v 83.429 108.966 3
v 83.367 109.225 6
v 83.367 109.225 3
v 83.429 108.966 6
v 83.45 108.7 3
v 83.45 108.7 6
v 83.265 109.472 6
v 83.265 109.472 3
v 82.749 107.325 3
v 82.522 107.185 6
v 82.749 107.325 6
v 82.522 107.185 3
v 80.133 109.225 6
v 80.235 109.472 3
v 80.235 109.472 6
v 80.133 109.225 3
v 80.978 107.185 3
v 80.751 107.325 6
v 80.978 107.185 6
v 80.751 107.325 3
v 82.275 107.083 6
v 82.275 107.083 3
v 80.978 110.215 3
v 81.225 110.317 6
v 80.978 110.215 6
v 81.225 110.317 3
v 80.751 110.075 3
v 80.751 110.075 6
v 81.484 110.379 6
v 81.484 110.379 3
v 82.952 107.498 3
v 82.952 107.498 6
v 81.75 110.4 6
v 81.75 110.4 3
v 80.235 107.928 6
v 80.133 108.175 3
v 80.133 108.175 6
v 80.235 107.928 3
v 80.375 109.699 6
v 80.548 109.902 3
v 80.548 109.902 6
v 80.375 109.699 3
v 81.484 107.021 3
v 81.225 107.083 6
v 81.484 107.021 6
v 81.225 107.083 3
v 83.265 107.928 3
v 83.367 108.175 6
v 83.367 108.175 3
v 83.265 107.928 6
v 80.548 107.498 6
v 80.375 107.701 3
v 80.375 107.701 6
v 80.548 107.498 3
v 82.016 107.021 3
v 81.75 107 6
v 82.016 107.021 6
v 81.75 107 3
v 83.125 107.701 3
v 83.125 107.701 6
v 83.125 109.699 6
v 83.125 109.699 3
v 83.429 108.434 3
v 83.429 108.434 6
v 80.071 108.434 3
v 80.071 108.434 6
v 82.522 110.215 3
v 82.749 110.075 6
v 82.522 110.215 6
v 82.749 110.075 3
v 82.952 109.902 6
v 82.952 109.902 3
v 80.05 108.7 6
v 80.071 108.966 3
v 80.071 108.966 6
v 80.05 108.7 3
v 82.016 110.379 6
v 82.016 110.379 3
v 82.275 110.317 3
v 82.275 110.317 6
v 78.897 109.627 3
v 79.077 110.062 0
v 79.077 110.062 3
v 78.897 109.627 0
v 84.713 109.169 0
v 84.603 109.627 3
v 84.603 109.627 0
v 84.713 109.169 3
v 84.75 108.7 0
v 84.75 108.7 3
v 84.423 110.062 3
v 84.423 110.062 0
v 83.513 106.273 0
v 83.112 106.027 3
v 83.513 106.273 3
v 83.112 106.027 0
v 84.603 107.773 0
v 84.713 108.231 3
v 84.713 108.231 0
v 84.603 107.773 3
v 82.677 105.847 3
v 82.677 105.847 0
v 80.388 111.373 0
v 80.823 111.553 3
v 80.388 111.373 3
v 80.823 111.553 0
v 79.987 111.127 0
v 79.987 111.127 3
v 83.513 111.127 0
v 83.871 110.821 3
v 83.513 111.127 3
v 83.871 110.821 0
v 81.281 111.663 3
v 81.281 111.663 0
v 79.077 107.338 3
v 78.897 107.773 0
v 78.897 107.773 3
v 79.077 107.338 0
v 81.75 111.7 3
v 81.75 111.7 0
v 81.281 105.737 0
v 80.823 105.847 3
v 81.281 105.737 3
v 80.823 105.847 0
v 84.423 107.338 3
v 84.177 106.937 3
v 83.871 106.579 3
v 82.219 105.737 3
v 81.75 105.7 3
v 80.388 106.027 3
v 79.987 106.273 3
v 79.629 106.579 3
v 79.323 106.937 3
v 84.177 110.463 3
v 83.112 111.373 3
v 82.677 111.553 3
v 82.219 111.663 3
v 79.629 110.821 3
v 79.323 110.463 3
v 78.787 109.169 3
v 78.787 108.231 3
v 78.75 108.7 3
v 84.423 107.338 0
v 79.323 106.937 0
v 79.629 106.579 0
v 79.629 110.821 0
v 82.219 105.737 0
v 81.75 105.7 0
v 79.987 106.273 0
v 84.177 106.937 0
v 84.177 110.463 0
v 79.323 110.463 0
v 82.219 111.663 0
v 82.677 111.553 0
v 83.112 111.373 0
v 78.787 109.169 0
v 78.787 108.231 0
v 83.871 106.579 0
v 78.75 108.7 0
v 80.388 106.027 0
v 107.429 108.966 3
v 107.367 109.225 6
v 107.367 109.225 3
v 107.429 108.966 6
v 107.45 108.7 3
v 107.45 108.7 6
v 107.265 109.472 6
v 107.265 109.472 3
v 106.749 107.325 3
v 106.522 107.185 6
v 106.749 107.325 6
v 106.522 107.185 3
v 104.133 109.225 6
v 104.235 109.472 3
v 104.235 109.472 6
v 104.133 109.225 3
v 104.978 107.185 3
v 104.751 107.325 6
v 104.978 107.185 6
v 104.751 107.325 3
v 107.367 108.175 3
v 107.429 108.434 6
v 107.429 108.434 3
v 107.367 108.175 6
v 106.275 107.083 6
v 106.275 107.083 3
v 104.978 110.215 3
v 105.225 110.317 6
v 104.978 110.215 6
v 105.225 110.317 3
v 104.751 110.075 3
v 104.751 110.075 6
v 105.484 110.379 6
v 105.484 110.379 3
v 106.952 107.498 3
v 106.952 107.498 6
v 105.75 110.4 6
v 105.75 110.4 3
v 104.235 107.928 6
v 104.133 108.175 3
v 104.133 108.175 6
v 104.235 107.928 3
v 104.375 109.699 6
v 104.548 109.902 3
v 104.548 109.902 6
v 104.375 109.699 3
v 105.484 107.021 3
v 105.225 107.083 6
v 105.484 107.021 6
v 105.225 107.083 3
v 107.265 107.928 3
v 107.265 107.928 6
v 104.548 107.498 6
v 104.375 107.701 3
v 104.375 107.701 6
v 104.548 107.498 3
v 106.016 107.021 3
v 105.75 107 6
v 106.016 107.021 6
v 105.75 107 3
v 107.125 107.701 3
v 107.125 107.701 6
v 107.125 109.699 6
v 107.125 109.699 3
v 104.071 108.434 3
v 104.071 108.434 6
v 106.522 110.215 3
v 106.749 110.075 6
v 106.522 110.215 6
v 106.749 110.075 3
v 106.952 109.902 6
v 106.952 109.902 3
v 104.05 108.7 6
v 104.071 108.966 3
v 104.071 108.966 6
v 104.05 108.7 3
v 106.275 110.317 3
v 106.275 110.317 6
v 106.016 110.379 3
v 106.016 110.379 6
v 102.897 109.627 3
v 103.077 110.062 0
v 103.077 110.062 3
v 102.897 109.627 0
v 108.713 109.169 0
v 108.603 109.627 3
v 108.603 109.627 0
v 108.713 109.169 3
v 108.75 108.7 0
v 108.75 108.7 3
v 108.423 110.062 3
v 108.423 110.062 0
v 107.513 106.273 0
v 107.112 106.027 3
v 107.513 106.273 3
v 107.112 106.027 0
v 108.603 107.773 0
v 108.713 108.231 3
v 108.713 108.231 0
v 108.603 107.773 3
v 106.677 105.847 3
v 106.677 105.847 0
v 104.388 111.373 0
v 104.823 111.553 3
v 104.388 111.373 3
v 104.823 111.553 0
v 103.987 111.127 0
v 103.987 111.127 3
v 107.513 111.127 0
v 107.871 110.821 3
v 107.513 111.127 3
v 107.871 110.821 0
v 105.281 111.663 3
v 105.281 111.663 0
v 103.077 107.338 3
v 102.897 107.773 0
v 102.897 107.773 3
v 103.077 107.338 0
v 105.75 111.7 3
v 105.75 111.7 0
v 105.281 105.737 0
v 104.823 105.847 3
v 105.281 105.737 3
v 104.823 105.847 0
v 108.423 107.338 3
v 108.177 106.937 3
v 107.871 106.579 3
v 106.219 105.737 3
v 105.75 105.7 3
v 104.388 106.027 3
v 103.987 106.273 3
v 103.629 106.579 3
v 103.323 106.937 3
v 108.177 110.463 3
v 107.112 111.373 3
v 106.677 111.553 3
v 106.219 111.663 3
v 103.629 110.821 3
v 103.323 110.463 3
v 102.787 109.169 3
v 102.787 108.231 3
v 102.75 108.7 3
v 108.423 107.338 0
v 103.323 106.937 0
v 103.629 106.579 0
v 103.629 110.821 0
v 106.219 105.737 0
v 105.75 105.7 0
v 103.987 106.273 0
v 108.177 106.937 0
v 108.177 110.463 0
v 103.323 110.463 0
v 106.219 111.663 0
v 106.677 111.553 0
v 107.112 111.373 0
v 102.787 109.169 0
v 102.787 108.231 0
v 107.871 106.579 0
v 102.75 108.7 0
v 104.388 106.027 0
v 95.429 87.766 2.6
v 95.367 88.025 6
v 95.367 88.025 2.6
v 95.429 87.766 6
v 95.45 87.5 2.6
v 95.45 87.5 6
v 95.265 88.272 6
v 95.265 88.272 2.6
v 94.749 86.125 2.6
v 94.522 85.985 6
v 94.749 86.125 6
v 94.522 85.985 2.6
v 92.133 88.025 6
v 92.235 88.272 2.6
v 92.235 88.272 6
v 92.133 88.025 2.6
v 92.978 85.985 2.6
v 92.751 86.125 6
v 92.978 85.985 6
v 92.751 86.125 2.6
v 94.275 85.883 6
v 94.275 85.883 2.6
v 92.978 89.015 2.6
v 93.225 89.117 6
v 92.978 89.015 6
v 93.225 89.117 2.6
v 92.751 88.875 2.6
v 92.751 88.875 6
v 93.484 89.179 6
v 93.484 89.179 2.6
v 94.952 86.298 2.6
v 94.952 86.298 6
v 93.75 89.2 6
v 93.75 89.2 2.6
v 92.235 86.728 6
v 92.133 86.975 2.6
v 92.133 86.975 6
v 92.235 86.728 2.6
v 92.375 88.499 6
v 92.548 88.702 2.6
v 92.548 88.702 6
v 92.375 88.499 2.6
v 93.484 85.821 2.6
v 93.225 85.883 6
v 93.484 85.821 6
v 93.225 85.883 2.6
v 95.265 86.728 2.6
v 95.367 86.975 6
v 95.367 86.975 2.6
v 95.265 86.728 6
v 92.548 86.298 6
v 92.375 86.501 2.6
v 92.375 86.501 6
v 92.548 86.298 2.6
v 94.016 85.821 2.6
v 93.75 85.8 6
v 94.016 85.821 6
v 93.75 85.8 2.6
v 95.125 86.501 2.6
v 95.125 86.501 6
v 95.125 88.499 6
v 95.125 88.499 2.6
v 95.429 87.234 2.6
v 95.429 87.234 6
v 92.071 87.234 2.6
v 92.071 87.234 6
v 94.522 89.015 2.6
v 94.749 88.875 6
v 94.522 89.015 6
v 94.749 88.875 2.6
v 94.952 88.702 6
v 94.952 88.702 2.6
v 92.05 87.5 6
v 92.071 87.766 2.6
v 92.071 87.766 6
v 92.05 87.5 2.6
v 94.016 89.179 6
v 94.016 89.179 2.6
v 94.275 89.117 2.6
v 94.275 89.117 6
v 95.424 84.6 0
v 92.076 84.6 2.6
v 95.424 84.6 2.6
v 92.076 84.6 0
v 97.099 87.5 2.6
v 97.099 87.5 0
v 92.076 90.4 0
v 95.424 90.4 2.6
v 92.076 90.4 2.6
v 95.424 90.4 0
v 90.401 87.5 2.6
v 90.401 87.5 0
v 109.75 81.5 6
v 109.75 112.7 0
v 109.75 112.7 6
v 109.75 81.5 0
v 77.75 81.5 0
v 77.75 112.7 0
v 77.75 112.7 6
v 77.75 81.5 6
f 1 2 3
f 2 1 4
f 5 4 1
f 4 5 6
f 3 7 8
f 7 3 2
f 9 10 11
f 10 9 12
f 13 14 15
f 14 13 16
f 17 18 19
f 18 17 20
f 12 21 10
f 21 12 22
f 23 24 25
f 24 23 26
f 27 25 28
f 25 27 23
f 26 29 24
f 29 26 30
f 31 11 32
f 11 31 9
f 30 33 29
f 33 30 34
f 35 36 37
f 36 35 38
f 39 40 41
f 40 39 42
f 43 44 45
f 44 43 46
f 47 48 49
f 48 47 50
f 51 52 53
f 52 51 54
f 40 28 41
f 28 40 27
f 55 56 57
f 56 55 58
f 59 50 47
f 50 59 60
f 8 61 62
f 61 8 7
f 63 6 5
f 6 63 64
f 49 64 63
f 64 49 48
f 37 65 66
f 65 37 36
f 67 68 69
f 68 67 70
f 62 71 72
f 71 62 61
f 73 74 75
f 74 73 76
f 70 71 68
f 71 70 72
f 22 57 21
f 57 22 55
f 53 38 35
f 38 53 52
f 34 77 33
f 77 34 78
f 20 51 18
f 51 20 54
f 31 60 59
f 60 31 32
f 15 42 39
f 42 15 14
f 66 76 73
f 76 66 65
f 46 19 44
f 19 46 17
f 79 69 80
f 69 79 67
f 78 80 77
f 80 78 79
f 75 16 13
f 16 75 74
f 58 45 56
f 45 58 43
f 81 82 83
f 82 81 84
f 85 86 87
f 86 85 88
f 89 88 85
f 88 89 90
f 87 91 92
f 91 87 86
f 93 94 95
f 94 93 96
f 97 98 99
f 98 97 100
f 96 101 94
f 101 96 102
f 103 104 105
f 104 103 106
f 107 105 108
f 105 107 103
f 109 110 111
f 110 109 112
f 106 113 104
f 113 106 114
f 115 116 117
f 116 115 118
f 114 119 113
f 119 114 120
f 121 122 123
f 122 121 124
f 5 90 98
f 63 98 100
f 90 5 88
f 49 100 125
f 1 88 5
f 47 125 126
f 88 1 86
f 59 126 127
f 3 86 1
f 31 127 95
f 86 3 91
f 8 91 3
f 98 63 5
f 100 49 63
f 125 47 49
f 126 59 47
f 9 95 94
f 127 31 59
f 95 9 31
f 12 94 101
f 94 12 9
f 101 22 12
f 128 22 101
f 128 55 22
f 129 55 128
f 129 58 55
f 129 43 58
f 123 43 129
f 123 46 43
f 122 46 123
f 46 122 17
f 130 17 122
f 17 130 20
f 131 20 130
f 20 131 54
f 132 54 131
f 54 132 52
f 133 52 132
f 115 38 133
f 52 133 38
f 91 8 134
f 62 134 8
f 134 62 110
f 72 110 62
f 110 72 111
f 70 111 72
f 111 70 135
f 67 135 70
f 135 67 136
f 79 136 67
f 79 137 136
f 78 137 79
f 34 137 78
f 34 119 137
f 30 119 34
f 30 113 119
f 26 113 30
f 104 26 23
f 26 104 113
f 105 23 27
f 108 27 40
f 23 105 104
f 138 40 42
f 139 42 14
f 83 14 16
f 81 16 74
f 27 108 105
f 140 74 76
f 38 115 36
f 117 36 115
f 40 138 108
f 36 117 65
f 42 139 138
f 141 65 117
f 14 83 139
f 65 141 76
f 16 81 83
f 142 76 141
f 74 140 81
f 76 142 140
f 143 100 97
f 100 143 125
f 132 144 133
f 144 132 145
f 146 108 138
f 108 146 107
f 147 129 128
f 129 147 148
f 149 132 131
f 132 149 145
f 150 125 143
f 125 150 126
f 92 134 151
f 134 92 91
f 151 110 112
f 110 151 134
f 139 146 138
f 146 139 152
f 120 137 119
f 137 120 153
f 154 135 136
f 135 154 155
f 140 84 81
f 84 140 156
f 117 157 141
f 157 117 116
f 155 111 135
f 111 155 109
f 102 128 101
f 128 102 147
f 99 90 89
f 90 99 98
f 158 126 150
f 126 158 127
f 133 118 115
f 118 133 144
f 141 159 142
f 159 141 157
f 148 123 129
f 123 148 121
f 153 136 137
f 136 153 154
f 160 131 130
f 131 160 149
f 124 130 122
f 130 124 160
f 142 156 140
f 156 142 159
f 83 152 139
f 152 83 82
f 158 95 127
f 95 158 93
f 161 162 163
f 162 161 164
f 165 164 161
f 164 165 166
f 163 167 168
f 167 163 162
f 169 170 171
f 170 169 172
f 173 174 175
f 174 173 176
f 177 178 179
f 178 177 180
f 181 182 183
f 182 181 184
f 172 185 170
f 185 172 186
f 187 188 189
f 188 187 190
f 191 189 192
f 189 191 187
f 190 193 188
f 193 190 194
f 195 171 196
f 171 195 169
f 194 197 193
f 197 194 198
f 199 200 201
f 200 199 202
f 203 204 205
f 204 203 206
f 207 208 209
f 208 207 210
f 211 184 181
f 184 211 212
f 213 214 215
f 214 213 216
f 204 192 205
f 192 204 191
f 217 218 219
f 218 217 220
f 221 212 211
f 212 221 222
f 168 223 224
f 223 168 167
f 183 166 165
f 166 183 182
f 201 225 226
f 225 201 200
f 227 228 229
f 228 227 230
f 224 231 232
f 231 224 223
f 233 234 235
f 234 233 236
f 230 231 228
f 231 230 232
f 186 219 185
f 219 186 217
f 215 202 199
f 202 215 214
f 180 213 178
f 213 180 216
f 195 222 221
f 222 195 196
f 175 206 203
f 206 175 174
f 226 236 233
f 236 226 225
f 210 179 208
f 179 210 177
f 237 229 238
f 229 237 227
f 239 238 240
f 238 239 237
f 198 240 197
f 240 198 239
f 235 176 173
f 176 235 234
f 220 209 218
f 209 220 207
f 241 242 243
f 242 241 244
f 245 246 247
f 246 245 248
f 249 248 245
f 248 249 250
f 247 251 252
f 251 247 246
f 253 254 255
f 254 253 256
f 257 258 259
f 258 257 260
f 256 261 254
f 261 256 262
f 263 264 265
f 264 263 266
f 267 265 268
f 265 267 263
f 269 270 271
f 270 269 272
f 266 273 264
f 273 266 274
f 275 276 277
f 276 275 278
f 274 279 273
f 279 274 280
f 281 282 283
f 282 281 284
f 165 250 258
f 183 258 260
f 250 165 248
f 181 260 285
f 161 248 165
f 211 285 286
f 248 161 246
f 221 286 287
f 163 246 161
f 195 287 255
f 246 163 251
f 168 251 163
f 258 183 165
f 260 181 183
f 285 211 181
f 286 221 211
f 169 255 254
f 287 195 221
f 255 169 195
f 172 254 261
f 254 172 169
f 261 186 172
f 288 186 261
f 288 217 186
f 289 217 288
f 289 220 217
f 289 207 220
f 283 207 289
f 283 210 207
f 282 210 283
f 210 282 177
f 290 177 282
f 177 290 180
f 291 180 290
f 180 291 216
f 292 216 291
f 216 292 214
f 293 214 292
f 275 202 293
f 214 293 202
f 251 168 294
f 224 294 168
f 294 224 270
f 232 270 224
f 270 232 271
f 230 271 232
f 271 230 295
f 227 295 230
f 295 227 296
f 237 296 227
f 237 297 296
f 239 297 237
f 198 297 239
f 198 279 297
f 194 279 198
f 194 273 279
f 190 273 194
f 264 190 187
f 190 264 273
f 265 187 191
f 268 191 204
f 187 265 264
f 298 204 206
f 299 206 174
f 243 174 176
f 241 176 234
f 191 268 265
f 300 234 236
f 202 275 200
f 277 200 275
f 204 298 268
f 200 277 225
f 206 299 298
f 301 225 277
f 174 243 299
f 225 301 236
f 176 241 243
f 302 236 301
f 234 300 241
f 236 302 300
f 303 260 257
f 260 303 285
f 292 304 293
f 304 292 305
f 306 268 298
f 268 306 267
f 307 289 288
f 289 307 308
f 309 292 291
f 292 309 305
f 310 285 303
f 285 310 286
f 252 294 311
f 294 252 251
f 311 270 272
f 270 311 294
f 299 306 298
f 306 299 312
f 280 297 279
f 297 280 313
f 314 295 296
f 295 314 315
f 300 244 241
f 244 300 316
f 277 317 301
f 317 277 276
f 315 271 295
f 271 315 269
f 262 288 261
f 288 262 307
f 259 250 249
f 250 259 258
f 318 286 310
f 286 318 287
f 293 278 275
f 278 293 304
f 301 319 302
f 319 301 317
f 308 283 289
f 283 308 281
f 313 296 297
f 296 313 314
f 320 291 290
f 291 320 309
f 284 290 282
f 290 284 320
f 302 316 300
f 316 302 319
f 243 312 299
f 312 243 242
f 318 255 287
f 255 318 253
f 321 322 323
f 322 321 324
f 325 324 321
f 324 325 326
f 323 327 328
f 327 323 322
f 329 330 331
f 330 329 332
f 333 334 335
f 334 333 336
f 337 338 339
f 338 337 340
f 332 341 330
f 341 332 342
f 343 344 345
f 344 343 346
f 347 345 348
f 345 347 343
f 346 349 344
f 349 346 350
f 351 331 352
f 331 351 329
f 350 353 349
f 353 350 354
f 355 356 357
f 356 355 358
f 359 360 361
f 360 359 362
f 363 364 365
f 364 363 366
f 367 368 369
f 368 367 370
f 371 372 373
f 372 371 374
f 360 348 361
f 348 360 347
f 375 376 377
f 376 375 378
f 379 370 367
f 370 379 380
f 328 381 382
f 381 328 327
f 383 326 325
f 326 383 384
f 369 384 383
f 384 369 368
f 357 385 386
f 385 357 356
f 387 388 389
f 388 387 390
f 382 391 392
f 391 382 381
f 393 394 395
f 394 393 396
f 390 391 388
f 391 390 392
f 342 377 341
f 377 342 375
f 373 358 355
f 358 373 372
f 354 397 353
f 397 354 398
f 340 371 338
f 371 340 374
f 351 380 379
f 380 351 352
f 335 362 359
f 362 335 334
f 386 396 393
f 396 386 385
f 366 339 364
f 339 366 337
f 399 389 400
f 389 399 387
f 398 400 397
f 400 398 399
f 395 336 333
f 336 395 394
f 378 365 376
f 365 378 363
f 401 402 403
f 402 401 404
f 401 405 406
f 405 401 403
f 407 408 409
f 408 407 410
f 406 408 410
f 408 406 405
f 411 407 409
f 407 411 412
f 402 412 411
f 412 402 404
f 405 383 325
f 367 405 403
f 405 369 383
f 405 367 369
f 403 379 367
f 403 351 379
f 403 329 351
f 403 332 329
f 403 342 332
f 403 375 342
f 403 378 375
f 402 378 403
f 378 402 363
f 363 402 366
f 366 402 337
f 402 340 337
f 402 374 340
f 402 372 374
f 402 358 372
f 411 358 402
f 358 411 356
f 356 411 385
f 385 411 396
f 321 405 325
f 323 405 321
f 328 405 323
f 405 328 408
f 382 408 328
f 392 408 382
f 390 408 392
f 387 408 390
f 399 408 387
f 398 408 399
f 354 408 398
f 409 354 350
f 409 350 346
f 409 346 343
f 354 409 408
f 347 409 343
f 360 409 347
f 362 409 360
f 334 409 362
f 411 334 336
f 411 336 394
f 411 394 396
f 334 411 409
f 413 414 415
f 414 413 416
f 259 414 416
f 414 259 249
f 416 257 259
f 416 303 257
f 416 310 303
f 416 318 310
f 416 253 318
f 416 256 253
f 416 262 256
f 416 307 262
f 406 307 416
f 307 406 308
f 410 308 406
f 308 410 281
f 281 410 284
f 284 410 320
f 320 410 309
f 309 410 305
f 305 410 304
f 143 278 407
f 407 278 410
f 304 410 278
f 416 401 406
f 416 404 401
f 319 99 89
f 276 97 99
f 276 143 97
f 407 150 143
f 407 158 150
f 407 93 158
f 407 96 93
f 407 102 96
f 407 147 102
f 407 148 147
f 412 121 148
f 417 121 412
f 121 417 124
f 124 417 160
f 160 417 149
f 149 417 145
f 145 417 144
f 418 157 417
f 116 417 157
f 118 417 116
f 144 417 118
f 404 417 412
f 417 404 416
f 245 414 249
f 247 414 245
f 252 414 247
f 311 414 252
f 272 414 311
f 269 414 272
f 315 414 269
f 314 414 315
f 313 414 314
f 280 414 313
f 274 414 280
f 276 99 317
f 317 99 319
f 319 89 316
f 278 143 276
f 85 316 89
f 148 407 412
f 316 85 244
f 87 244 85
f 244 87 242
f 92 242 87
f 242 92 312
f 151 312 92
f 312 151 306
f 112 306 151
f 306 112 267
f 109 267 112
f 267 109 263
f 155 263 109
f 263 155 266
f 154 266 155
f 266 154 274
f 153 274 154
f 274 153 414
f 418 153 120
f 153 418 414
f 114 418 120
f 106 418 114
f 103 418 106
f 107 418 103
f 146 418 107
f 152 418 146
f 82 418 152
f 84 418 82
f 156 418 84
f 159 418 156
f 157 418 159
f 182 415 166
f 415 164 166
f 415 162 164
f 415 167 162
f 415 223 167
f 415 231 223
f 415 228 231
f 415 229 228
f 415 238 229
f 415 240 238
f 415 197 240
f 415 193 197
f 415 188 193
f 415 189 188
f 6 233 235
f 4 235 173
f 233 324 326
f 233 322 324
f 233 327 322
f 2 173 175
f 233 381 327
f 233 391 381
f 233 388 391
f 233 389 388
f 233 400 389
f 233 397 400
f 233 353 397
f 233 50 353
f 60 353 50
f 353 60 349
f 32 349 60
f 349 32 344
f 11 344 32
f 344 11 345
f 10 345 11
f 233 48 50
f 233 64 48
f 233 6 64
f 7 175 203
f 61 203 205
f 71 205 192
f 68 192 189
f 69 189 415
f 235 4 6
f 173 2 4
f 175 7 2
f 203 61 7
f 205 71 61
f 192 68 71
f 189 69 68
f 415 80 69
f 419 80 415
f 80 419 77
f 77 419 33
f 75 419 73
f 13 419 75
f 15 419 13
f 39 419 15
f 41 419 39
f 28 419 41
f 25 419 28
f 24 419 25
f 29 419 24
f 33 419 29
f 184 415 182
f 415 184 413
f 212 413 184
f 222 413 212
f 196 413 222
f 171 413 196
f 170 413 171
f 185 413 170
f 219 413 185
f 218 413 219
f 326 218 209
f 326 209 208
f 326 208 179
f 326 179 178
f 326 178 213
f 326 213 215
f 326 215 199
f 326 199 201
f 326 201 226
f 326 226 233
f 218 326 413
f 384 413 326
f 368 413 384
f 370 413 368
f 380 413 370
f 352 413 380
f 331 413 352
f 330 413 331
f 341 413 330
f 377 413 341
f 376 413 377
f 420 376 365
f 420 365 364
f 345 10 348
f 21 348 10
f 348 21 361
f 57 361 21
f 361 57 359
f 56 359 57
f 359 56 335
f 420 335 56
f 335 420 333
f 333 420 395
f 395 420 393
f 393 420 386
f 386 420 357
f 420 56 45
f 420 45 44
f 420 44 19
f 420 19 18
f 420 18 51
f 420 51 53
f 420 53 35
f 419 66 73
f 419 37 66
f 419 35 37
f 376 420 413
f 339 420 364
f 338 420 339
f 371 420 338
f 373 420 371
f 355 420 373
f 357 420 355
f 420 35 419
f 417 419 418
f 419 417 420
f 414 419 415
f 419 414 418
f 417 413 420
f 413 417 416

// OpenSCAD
include <../lib/pouch-comms-module-lib.scad>;
$fn = 40;
cage_print();
